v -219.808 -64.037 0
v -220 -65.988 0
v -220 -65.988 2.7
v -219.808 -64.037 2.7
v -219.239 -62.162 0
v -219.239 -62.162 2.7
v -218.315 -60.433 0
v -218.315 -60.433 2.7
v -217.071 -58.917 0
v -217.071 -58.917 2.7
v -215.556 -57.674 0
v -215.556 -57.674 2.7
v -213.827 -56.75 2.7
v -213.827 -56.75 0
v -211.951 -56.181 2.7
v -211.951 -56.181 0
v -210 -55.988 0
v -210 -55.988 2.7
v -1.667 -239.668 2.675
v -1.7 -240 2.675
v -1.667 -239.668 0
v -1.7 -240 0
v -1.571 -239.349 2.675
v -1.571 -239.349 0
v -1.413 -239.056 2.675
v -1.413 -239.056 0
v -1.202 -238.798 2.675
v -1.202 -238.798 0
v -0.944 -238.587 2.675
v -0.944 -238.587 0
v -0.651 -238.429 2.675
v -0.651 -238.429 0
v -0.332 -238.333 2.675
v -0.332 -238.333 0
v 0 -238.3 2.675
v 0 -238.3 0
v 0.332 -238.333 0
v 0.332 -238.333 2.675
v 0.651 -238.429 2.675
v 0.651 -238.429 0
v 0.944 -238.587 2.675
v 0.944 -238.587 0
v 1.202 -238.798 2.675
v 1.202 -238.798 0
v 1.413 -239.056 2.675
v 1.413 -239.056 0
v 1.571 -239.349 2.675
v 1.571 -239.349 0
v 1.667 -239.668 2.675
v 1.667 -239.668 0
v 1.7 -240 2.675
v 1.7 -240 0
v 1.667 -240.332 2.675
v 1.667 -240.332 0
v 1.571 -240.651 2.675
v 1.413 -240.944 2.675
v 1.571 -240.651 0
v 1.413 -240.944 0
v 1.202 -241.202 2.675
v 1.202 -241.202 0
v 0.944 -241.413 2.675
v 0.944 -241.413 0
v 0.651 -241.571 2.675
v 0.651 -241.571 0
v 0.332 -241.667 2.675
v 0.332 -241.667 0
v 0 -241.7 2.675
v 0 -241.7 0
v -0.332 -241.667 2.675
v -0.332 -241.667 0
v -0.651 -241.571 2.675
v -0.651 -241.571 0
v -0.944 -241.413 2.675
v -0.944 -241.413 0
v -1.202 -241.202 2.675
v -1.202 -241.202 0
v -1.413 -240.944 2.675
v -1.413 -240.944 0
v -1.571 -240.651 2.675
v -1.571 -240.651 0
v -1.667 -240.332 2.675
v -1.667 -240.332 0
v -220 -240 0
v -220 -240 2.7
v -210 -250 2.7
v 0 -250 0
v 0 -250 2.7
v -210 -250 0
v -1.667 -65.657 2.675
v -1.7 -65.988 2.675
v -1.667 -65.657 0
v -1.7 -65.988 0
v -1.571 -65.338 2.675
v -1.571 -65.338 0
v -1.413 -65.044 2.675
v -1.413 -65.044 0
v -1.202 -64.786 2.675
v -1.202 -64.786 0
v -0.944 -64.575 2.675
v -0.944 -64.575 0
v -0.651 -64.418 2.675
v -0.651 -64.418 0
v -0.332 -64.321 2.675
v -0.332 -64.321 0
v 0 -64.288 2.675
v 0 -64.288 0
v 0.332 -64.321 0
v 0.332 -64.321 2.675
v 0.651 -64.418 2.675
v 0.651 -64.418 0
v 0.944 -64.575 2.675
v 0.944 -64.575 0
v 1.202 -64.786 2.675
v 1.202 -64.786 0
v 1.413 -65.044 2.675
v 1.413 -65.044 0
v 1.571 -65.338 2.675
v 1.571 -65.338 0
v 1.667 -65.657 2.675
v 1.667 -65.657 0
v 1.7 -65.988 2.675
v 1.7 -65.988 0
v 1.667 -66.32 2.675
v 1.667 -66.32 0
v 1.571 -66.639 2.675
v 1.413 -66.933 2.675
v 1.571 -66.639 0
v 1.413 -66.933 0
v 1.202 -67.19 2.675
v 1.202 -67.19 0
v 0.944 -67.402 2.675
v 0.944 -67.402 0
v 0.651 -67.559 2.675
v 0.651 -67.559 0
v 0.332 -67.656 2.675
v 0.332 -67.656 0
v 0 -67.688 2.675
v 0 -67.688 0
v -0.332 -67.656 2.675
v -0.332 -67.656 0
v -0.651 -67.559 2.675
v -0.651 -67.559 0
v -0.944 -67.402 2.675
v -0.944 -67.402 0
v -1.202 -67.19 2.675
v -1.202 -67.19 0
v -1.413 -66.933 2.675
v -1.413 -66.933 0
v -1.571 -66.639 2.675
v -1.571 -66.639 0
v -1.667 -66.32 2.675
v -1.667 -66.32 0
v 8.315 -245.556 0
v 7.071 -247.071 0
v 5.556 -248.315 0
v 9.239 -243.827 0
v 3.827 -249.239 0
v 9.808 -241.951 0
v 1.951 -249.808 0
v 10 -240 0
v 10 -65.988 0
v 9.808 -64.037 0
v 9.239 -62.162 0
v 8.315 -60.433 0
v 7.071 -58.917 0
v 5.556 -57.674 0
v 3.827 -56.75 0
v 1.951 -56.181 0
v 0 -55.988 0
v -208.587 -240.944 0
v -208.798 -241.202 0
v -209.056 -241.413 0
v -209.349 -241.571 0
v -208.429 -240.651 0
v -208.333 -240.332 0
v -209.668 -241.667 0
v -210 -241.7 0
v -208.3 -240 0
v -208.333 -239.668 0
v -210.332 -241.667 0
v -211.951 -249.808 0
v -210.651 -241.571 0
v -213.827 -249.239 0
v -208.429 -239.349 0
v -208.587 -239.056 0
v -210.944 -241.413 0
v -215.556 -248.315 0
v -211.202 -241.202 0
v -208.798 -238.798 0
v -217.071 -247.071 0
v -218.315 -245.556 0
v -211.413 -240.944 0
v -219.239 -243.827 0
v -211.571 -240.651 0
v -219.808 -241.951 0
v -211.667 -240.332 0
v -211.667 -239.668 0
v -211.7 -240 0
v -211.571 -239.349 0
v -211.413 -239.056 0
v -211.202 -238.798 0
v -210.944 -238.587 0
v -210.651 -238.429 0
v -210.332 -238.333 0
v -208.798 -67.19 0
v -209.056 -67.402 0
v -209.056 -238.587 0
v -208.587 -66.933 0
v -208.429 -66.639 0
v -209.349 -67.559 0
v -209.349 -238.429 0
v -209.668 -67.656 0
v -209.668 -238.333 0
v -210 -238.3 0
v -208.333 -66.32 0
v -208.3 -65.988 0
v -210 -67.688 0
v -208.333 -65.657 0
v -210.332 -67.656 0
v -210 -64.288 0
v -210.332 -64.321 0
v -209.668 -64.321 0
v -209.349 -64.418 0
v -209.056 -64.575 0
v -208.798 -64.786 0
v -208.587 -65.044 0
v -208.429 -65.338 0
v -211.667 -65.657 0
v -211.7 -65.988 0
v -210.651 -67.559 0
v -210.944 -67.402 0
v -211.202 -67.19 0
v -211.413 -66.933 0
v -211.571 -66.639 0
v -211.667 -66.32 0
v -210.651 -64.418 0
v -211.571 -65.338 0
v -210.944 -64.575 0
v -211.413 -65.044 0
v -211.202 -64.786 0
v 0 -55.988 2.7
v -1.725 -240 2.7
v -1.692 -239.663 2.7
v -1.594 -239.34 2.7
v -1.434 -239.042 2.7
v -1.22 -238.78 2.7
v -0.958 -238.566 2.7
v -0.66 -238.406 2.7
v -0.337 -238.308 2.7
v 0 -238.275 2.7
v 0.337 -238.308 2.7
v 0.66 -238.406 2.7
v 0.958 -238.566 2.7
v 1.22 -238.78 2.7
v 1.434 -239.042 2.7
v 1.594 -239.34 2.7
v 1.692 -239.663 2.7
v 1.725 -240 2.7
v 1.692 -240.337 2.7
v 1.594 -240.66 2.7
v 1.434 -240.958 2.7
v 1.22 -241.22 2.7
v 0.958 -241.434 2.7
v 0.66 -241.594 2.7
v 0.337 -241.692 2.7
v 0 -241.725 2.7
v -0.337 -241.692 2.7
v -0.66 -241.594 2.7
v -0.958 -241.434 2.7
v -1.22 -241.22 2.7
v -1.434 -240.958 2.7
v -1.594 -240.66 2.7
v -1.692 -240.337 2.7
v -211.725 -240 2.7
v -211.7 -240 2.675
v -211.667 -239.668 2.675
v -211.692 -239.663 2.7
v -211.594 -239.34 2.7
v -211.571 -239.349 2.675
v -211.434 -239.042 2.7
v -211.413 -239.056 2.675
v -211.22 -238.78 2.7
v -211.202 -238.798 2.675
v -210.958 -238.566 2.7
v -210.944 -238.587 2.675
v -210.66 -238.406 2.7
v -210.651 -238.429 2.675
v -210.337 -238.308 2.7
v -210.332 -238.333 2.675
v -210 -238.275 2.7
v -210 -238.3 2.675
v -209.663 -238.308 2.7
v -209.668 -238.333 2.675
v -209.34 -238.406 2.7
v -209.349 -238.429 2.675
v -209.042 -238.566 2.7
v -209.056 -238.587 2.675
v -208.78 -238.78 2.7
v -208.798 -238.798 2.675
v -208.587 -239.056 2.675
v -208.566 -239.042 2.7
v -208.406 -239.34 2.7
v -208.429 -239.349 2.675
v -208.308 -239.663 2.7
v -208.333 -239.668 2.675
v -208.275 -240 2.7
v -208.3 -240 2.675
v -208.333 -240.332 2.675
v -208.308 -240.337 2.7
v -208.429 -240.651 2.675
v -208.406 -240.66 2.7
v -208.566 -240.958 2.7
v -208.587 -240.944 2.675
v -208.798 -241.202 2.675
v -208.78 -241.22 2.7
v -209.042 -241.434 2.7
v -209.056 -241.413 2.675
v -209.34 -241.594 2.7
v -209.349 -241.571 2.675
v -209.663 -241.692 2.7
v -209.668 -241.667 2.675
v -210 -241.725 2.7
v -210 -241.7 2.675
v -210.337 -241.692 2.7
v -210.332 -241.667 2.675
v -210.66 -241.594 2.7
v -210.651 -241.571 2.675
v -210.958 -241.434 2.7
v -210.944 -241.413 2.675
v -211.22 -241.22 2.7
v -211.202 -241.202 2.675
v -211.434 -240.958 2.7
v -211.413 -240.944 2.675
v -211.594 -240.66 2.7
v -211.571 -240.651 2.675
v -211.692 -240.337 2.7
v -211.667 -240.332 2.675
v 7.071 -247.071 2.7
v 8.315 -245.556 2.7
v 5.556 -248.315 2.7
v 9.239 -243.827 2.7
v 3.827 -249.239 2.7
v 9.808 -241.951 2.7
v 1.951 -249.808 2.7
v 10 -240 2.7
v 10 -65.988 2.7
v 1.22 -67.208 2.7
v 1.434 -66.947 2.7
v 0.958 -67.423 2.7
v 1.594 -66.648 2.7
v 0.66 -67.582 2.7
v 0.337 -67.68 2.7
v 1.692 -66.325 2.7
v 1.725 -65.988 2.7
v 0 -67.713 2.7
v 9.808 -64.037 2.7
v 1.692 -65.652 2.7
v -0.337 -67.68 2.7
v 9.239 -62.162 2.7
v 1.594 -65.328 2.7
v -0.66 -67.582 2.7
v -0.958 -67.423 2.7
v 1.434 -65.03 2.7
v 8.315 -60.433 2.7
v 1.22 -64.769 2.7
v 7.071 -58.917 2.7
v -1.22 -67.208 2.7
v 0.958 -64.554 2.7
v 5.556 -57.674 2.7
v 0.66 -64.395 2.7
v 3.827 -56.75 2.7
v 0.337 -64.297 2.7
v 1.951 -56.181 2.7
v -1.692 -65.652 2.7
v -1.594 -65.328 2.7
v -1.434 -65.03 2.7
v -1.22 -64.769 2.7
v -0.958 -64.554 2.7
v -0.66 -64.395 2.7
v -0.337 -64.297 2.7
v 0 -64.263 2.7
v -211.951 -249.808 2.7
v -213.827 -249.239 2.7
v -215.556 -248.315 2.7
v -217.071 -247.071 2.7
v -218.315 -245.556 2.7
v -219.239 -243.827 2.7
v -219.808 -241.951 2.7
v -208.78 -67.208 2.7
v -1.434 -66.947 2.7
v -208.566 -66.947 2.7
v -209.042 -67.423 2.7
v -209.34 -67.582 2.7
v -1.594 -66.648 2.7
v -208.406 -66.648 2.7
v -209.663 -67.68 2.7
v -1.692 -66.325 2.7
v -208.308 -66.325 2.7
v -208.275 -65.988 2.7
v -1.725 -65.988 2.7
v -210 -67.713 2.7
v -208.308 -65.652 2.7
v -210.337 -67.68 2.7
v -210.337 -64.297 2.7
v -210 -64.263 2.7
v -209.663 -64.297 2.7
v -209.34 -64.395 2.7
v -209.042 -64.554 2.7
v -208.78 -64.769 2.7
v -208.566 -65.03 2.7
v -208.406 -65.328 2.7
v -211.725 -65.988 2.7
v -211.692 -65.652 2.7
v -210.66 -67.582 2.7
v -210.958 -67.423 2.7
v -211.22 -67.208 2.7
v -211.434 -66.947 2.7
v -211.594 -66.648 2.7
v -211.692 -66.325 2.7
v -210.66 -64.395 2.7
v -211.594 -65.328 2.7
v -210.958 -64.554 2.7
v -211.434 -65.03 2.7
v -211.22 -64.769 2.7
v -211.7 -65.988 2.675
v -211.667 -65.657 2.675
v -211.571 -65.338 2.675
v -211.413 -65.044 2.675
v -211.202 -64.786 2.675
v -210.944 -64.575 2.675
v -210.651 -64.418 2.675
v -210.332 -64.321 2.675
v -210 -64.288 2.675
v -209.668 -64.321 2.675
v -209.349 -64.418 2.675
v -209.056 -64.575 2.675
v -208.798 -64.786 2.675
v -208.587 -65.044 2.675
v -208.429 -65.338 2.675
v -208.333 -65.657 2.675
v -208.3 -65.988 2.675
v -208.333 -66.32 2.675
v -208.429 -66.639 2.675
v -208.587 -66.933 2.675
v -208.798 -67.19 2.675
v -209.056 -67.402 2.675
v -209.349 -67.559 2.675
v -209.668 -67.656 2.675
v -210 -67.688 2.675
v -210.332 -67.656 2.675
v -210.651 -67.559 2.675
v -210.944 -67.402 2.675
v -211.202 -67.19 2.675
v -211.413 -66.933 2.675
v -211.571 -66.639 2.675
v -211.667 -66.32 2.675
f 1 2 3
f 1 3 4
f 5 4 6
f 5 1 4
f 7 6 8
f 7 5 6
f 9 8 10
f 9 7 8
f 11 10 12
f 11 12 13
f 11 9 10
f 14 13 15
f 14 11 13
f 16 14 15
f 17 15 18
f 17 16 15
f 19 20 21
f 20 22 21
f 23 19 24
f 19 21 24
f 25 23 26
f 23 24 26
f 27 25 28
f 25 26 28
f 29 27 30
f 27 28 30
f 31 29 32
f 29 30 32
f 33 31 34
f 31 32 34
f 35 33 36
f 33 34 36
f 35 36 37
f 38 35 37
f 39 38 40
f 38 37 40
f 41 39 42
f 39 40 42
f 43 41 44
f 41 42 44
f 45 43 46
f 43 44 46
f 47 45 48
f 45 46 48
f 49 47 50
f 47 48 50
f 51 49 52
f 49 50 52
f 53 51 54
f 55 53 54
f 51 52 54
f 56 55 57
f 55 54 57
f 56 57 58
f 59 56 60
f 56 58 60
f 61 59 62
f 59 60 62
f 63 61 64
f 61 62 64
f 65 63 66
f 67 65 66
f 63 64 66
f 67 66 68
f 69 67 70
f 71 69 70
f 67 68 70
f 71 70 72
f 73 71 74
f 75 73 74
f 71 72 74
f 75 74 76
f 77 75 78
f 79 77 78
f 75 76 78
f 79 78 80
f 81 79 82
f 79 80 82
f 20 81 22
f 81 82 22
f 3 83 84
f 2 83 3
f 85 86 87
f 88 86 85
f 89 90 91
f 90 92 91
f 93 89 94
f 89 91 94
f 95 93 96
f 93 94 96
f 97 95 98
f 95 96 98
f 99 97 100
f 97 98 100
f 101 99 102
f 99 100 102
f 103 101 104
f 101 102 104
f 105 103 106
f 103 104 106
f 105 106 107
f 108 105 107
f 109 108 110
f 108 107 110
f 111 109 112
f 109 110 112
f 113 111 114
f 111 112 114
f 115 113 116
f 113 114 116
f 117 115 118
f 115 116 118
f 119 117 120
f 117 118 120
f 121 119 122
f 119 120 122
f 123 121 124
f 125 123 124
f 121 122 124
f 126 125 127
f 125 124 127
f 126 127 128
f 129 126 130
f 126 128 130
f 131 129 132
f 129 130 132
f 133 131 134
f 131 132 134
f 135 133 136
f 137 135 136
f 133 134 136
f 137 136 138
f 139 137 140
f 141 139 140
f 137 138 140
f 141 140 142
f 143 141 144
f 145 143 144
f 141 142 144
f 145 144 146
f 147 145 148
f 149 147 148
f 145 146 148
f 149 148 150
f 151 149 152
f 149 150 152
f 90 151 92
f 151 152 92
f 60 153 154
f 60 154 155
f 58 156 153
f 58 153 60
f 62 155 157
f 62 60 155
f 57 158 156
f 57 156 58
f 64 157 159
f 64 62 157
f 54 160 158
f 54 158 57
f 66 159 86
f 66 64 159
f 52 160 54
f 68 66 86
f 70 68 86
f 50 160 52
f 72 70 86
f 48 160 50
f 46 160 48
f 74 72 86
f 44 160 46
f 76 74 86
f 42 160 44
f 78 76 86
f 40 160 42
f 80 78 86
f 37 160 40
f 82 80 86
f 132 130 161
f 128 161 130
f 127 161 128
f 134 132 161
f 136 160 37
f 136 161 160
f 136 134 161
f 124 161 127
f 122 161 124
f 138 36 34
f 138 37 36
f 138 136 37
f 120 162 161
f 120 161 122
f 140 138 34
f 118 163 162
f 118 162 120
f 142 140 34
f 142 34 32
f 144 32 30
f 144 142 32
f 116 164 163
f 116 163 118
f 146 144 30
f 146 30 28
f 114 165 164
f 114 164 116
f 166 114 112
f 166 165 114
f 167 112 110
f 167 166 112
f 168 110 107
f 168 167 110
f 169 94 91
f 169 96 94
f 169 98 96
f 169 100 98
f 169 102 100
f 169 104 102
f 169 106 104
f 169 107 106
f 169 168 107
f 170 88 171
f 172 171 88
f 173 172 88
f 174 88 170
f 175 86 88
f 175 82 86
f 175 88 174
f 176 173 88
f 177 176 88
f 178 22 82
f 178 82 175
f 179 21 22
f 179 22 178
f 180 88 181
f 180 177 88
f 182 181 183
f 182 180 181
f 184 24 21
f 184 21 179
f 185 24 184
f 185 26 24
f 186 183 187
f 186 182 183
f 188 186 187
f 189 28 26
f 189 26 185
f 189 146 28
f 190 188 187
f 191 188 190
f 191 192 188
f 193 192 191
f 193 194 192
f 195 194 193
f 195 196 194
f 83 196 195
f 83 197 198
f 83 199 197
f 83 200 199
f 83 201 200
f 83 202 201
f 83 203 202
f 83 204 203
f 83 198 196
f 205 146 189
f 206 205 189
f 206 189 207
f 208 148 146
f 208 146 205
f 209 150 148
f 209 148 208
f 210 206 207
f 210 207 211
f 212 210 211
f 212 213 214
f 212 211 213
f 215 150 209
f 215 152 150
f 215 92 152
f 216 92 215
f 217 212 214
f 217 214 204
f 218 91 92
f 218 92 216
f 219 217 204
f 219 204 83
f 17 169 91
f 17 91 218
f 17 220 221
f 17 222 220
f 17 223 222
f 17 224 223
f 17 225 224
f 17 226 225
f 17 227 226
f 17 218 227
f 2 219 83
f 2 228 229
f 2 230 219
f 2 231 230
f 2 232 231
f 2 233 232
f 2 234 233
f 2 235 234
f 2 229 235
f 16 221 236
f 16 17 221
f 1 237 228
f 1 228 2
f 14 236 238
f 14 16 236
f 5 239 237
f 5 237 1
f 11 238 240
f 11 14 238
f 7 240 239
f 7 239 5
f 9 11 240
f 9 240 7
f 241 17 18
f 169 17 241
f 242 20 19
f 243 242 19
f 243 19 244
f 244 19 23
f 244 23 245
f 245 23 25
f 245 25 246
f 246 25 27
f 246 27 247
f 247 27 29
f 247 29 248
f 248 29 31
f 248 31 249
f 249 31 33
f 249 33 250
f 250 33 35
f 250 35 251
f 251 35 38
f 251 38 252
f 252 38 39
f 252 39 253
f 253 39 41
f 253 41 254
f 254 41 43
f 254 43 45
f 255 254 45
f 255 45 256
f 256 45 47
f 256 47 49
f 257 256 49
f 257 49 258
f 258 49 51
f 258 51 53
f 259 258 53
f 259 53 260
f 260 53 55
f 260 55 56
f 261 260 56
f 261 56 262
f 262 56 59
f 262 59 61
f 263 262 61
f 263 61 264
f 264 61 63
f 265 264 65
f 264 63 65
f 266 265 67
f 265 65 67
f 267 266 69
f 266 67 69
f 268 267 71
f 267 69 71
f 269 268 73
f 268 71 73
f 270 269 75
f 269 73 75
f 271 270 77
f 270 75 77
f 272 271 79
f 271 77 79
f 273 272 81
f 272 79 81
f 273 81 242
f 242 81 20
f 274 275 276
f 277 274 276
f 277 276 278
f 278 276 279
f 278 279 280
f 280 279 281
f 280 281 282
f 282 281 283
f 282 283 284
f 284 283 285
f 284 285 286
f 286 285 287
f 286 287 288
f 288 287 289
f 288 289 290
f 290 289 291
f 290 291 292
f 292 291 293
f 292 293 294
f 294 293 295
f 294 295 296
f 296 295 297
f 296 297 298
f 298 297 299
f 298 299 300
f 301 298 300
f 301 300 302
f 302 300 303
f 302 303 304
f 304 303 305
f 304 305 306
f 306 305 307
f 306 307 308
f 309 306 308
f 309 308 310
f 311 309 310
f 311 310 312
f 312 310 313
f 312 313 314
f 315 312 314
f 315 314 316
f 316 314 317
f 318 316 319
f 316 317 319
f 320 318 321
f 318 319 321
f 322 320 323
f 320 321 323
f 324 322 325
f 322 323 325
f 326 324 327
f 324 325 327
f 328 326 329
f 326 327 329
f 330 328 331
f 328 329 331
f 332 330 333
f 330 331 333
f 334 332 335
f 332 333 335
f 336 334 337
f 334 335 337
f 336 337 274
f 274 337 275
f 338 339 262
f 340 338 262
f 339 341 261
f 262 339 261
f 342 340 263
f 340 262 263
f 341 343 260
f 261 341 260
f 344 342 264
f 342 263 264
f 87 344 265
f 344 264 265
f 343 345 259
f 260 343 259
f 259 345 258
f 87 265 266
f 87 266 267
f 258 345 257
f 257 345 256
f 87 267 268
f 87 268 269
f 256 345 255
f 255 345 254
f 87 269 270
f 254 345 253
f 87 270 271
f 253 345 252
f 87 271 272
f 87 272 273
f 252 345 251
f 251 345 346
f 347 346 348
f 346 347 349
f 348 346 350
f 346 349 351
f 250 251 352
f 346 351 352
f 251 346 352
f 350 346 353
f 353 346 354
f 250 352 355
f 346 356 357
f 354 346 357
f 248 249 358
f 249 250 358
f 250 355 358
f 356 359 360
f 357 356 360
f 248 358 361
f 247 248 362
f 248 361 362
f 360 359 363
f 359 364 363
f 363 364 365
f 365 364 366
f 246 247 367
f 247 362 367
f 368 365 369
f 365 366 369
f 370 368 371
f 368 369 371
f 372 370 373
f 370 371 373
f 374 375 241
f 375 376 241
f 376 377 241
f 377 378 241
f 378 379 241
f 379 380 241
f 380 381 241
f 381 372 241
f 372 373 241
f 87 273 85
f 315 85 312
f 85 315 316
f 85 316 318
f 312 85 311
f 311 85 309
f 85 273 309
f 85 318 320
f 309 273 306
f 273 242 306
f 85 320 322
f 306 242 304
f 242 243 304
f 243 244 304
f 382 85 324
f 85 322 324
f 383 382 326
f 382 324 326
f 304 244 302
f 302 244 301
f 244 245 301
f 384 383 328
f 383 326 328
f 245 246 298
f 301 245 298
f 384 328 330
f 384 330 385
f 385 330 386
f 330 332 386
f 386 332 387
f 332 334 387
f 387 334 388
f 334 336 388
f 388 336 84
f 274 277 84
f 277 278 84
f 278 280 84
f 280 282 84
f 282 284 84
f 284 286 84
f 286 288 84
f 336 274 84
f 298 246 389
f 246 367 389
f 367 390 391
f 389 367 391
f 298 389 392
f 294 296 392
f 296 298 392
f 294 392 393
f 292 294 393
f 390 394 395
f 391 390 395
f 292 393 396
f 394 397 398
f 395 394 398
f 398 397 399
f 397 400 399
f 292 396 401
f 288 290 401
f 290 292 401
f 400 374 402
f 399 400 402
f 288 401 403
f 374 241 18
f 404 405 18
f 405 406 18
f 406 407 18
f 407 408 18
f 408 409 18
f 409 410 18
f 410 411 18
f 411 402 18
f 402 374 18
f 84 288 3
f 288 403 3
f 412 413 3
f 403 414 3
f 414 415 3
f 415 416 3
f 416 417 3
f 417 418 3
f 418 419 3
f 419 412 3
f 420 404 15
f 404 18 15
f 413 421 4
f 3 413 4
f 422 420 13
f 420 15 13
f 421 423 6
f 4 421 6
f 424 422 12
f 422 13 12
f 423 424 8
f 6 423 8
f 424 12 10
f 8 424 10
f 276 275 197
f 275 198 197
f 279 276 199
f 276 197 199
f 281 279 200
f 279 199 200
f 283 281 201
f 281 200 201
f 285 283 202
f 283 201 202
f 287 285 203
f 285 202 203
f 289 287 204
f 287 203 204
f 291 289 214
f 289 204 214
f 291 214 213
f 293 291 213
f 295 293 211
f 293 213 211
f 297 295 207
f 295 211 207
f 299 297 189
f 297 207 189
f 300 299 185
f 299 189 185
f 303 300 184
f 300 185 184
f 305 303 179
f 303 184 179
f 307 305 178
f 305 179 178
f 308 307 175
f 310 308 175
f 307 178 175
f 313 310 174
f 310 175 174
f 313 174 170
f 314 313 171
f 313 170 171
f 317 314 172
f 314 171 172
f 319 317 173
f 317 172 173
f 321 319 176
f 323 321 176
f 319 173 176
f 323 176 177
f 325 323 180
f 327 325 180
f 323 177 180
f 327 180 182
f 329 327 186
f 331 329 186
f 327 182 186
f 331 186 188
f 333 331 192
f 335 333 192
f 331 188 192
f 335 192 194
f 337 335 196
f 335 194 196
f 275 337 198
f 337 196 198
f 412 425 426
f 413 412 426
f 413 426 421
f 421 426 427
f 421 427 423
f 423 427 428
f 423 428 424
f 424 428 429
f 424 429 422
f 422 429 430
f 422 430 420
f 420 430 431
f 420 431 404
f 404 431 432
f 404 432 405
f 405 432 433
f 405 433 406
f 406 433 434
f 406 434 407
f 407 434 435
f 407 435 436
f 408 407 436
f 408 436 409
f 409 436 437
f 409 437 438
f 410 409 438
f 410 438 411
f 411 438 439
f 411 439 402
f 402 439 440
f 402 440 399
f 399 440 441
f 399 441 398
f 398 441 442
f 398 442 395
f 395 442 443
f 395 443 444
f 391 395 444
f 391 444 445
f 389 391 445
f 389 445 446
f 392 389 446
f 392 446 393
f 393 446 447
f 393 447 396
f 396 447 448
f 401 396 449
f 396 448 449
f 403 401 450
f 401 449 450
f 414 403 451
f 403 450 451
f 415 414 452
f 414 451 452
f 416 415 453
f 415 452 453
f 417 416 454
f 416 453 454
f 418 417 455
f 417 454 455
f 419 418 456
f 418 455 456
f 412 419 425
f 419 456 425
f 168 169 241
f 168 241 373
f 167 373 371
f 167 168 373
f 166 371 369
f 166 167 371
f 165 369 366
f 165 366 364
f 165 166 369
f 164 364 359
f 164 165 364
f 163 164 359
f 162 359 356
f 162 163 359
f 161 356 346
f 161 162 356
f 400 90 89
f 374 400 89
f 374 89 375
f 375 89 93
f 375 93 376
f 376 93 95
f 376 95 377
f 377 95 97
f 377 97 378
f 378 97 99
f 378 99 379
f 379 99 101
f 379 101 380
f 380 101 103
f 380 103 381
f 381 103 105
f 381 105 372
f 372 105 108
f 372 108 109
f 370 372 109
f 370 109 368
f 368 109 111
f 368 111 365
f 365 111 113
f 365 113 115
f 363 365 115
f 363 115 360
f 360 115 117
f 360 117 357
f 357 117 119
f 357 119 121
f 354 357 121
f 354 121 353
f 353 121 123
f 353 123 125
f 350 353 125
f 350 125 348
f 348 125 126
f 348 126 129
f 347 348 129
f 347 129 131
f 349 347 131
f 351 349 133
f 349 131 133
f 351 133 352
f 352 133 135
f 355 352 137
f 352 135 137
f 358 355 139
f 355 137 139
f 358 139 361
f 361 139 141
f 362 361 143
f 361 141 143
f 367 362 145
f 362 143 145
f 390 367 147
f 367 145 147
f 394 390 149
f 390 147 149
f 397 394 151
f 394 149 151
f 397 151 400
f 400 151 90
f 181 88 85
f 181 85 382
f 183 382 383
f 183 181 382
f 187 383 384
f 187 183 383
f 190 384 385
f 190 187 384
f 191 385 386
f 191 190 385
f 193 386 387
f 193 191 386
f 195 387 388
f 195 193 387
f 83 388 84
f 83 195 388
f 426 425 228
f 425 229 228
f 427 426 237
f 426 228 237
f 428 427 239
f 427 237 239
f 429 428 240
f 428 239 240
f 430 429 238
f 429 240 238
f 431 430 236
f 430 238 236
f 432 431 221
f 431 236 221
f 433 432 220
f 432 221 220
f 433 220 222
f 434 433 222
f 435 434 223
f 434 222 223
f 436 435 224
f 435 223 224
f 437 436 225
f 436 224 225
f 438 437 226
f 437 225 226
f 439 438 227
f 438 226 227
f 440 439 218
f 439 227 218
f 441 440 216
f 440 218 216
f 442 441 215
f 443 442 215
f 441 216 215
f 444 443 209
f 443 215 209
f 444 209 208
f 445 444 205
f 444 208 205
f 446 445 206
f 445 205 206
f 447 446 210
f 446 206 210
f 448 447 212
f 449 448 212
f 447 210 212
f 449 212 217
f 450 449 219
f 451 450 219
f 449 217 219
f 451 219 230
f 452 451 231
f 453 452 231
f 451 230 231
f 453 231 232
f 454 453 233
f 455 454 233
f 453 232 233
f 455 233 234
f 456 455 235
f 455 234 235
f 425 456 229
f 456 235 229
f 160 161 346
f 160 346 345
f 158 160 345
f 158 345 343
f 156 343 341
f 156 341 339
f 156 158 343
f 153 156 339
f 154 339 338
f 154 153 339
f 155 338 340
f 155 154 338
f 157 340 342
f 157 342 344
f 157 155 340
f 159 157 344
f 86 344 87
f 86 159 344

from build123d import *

# Parameters (mm, degrees)
BOSS_EXTRUDE1_DEPTH            = 2.7
M3_CLEARANCE_HOLE1_D           = 3.4
M3_CLEARANCE_HOLE1_CSINK_D     = 3.45
M3_CLEARANCE_HOLE1_CSINK_ANGLE = 90


with BuildPart() as part:
    # Sketch1 → Boss-Extrude1 (new body)
    with BuildSketch(Plane.XY):
        with BuildLine():
            Line((0, -250), (-210, -250))
            ThreePointArc((-210, -250), (-217.071067812, -247.071067812), (-220, -240))
            Line((-220, -240), (-220, -65.98836919))
            ThreePointArc((-220, -65.98836919), (-217.071067812, -58.917301378), (-210, -55.98836919))
            Line((-210, -55.98836919), (0, -55.98836919))
            ThreePointArc((0, -55.98836919), (7.071067812, -58.917301378), (10, -65.98836919))
            Line((10, -65.98836919), (10, -240))
            ThreePointArc((10, -240), (7.071067812, -247.071067812), (0, -250))
        make_face()
    extrude(amount=BOSS_EXTRUDE1_DEPTH)

    # M3 Clearance Hole1 (through all)
    with Locations(Plane(origin=(0, -240, 2.7), x_dir=(1, 0, 0), z_dir=(0, 0, 1))):
        with Locations((0, 0), (-210, 0), (-210, 174.01163081), (0, 174.01163081)):
            CounterSinkHole(M3_CLEARANCE_HOLE1_D / 2, M3_CLEARANCE_HOLE1_CSINK_D / 2, counter_sink_angle=M3_CLEARANCE_HOLE1_CSINK_ANGLE)


solid = part.part
